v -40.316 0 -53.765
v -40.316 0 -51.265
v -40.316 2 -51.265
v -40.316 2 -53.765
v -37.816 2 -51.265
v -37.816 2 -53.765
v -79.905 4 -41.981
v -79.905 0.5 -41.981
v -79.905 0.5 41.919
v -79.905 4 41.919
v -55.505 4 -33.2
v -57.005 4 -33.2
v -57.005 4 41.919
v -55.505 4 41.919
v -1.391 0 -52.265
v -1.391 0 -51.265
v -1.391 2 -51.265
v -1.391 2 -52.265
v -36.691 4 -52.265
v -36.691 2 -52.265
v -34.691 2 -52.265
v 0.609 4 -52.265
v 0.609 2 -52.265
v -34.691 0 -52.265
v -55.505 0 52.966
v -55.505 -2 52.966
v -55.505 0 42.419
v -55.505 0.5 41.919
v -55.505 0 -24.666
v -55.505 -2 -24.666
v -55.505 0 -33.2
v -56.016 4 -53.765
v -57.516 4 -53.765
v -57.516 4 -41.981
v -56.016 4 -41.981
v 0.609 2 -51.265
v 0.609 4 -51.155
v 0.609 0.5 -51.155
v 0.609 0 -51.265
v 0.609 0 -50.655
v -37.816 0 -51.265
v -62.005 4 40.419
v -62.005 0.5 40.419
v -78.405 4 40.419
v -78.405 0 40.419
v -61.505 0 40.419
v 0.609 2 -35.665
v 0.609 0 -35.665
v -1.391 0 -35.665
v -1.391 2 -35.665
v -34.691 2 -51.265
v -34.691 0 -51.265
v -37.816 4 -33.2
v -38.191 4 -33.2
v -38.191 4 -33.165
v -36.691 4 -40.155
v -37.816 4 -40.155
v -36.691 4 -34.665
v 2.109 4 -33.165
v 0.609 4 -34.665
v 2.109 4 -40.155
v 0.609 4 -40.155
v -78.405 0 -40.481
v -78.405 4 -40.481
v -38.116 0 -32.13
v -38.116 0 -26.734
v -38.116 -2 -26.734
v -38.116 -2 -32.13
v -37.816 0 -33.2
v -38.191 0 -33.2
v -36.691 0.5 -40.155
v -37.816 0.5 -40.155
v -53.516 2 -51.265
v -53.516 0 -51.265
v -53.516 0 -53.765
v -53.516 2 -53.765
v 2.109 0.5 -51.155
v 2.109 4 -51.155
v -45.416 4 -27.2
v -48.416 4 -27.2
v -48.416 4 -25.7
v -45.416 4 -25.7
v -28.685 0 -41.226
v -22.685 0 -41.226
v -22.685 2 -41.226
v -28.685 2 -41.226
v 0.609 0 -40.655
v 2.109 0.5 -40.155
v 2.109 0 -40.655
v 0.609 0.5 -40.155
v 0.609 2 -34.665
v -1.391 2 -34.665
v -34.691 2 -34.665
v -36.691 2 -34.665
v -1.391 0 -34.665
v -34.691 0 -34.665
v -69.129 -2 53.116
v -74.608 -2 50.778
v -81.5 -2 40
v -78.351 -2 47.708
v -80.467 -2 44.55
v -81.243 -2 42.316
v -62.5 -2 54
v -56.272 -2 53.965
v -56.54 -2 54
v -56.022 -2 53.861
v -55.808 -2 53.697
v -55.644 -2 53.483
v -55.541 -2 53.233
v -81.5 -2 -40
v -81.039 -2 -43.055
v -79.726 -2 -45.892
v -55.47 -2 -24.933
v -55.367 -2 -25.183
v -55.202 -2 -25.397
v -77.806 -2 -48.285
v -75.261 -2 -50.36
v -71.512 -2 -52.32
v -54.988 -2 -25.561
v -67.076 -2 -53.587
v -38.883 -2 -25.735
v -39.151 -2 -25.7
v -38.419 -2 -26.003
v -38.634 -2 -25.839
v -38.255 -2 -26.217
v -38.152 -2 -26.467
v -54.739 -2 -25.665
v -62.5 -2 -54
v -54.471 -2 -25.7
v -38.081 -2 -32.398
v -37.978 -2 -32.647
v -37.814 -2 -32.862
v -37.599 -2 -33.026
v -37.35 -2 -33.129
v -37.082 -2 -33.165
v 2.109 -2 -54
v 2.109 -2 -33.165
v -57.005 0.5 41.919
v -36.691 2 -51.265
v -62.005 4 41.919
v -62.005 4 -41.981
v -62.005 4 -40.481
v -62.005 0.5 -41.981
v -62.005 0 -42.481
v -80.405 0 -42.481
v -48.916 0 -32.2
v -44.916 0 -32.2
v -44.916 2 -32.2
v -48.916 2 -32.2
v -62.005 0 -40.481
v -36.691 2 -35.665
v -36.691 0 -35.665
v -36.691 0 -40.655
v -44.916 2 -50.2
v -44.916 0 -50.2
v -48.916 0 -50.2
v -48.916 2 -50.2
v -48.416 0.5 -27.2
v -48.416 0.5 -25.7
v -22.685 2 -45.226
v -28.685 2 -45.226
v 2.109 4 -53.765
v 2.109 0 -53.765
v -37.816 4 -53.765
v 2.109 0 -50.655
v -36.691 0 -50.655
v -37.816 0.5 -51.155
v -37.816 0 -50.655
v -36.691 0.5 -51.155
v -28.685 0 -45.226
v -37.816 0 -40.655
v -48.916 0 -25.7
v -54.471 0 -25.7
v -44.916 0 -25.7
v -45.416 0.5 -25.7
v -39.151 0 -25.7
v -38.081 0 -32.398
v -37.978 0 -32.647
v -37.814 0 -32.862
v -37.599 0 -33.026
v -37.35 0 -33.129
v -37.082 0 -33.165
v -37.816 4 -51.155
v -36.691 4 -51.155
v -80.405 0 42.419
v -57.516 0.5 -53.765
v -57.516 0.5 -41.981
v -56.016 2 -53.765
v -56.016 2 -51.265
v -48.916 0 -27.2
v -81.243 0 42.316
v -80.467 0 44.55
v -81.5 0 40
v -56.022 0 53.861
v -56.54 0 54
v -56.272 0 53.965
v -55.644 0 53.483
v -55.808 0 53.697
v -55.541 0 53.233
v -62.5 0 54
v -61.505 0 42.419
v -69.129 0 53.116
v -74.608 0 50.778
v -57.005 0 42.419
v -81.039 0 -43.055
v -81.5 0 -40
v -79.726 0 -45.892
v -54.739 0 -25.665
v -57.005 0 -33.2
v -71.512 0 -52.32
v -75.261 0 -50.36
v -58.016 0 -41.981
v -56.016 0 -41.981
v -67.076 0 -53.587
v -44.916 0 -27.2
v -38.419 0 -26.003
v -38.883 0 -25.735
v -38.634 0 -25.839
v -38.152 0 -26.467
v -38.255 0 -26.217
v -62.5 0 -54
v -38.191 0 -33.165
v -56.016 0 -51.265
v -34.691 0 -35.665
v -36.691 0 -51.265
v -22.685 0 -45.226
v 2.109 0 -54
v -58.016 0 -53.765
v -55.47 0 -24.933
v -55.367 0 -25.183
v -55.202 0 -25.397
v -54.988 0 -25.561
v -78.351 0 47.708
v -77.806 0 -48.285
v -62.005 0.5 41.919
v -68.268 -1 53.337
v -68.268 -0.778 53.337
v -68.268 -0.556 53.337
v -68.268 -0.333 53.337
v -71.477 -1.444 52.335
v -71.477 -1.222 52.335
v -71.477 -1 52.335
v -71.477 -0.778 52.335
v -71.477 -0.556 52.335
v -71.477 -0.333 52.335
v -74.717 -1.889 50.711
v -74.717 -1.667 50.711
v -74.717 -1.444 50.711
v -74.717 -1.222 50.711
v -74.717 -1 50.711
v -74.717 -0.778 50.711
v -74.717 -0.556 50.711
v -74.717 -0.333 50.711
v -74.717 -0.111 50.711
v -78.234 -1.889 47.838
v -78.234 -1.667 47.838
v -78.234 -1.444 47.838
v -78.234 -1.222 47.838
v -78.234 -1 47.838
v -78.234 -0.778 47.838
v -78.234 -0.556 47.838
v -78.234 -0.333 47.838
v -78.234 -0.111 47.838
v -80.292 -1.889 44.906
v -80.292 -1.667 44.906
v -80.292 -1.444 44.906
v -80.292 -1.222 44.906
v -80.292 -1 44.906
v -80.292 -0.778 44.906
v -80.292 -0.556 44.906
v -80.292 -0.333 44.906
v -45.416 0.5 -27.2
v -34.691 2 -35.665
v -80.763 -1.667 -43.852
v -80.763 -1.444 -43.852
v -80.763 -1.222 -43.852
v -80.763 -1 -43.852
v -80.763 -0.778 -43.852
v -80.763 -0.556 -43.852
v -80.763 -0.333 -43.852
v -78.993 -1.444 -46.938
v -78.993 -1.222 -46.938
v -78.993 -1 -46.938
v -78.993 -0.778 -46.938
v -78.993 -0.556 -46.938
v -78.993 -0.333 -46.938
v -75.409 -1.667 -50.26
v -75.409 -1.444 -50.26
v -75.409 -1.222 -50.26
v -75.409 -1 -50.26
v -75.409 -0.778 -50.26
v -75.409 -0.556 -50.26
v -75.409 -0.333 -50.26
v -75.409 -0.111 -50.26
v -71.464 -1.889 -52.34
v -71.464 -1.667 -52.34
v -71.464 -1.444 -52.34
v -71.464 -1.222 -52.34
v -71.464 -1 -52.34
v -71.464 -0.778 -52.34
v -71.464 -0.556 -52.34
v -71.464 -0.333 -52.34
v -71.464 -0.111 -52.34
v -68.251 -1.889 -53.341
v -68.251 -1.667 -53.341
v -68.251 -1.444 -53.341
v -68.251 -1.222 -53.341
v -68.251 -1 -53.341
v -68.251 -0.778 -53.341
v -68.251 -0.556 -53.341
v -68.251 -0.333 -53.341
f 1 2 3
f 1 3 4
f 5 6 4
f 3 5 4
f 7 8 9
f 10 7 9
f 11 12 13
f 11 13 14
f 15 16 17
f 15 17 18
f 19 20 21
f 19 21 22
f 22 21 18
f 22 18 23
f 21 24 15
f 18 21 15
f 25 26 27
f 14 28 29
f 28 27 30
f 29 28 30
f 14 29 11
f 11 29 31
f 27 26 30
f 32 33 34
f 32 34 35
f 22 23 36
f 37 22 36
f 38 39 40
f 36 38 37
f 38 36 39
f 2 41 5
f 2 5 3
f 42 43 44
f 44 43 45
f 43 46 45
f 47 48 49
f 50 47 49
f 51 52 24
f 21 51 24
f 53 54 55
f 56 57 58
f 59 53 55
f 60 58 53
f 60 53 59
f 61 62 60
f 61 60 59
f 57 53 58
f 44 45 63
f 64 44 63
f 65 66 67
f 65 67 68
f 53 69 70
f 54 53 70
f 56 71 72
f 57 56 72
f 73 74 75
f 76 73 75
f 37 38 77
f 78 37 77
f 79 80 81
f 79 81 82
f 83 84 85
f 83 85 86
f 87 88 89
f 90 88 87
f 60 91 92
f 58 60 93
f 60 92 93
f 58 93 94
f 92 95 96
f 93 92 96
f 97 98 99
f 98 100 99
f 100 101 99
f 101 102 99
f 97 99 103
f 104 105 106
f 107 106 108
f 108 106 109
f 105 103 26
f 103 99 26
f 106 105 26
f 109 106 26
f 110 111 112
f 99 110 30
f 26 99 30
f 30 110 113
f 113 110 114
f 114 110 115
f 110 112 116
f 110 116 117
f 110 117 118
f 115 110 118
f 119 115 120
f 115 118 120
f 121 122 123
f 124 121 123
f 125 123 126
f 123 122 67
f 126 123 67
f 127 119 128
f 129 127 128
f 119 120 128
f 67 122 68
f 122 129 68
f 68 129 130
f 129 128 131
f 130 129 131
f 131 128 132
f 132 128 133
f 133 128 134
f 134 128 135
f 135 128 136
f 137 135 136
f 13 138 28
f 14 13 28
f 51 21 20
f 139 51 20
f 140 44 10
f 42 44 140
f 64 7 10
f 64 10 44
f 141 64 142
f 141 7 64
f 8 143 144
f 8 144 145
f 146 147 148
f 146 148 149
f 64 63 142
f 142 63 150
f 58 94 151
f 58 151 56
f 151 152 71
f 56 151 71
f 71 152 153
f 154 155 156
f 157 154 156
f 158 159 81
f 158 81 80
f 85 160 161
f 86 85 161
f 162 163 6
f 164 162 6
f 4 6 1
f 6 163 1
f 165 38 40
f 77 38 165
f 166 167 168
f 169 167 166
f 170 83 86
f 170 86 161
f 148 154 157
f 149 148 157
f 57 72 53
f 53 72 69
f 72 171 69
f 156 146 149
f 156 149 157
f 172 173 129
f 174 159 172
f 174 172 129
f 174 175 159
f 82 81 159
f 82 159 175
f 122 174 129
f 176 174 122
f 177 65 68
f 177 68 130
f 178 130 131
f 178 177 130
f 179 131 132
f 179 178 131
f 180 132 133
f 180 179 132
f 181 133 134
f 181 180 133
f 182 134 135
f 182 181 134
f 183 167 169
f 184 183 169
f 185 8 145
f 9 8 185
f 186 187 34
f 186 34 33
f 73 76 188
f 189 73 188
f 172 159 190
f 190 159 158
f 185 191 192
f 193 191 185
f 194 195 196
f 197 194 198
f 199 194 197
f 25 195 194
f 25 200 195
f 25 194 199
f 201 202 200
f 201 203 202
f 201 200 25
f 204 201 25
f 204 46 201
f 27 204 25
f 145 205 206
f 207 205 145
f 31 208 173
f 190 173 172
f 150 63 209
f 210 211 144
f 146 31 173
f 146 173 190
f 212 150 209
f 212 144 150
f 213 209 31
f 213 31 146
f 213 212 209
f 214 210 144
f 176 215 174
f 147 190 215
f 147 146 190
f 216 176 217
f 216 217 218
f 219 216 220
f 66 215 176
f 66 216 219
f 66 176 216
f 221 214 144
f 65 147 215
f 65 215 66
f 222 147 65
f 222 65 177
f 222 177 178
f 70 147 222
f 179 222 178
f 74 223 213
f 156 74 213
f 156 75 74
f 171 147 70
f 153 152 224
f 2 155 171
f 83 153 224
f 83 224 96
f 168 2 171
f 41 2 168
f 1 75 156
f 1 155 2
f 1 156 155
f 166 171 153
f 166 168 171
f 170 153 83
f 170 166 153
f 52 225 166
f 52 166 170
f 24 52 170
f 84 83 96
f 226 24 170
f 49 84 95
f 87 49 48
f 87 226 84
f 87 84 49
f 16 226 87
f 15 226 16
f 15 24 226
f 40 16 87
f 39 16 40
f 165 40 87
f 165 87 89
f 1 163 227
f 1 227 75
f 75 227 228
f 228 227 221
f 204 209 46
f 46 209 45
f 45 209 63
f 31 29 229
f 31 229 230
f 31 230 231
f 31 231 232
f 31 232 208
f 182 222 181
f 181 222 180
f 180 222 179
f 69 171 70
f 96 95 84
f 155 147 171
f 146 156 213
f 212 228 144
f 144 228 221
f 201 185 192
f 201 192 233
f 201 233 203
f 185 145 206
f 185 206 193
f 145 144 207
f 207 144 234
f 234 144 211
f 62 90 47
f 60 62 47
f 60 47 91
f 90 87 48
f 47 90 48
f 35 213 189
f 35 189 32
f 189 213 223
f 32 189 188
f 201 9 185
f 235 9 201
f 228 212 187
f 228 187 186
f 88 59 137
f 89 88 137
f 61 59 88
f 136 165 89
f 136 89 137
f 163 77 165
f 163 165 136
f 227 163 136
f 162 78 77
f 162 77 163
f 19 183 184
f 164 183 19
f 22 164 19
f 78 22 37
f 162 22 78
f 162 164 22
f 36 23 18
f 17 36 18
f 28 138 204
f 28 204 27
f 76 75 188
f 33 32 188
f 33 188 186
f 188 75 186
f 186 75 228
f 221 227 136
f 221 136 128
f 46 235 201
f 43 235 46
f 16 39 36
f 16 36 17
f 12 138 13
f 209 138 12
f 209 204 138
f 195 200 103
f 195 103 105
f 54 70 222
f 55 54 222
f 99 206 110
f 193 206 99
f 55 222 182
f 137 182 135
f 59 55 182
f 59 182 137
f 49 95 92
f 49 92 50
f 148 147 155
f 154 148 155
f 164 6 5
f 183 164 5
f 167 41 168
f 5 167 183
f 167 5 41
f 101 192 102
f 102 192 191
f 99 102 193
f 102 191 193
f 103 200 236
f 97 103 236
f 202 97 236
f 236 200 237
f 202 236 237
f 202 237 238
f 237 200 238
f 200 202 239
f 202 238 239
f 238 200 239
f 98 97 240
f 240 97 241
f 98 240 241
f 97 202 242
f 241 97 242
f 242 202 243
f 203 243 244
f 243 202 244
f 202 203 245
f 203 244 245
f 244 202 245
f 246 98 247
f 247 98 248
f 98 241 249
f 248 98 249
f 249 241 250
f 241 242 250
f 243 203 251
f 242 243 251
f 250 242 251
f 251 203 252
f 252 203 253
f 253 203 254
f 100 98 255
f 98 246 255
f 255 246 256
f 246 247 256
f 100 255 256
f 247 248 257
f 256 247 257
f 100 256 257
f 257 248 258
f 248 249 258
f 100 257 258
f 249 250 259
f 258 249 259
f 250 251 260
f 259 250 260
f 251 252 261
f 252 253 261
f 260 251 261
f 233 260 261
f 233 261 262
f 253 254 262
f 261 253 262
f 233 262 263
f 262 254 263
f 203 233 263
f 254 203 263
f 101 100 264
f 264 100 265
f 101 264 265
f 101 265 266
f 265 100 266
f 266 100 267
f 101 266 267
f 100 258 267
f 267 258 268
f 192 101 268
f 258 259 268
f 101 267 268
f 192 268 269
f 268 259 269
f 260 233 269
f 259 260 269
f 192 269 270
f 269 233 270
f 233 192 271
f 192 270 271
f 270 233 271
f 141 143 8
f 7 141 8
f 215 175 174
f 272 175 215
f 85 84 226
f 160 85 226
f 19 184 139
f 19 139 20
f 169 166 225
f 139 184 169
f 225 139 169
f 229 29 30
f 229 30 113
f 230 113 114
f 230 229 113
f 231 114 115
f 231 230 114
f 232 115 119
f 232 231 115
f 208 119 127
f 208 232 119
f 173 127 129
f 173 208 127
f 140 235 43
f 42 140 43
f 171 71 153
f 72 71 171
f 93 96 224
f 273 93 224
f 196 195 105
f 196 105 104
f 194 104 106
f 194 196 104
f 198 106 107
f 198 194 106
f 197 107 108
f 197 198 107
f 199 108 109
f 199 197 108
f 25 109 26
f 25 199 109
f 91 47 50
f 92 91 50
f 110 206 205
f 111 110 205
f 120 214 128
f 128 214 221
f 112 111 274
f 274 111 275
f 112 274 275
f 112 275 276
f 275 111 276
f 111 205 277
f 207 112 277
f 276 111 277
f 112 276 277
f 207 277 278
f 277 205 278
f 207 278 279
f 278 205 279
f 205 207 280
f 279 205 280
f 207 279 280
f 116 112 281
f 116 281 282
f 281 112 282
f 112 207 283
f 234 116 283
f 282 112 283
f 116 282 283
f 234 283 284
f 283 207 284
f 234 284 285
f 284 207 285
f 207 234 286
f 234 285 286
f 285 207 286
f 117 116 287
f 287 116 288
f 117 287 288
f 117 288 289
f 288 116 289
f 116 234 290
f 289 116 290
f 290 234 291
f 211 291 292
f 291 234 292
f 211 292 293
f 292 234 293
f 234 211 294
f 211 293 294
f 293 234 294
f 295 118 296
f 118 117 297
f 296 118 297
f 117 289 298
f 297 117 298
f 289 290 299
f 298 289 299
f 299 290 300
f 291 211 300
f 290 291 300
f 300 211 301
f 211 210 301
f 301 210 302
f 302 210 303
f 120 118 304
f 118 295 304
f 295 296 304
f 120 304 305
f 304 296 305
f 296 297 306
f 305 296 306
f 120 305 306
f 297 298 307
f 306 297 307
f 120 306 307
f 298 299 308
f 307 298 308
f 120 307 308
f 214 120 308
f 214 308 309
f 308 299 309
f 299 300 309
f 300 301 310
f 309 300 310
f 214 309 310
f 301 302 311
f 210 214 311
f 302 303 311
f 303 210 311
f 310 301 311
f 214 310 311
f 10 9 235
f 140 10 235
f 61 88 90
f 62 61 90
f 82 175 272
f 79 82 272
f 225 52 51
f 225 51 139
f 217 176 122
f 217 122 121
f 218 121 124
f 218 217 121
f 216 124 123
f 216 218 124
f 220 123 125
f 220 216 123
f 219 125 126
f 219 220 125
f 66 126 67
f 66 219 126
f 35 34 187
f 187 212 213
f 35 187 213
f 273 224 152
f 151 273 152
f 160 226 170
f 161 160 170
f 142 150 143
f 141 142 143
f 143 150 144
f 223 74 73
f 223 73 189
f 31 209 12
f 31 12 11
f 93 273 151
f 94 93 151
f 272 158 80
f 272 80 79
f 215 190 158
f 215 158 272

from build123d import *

# Parameters (mm, degrees)
BOSS_EXTRUDE1_DEPTH   = 4
SKETCH1_W             = 1.5
SKETCH1_H             = 11.783355086
BOSS_EXTRUDE1_2_DEPTH = 4
SKETCH1_H_2           = 75.118771789
BOSS_EXTRUDE1_3_DEPTH = 4
BOSS_EXTRUDE1_4_DEPTH = 4
BOSS_EXTRUDE1_5_DEPTH = 4
SKETCH1_W_2           = 3
SKETCH1_H_3           = 1.5
BOSS_EXTRUDE1_6_DEPTH = 4
BOSS_EXTRUDE2_DEPTH   = 2
SKETCH5_W             = 2.5
SKETCH5_H             = 2.5
SKETCH5_W_2           = 2
SKETCH5_H_2           = 1
SKETCH5_W_3           = 4
SKETCH5_H_3           = 18
SKETCH5_W_4           = 6
SKETCH5_H_4           = 4
BOSS_EXTRUDE3_DEPTH   = 2
CHAMFER1_SIZE         = 0.5


with BuildPart() as part:
    # Sketch1 → Boss-Extrude1 (new body)
    with BuildSketch(Plane(origin=(0, 0, 0), x_dir=(1, 0, 0), z_dir=(0, 1, 0))):
        Polygon((-78.405339878, 40.481228211), (-62.005339878, 40.481228211), (-62.005339878, 41.981228211), (-79.905339878, 41.981228211), (-79.905339878, -41.918771789), (-62.005339878, -41.918771789), (-62.005339878, -40.418771789), (-78.405339878, -40.418771789), align=None)
    extrude(amount=BOSS_EXTRUDE1_DEPTH)



with BuildPart() as body_2:
    # Sketch1 → Boss-Extrude1 2 (new body)
    with BuildSketch(Plane(origin=(0, 0, 0), x_dir=(1, 0, 0), z_dir=(0, 1, 0))):
        with Locations((-56.76645947, 47.872905754)):
            Rectangle(SKETCH1_W, SKETCH1_H)
    extrude(amount=BOSS_EXTRUDE1_2_DEPTH)


with BuildPart() as body_3:
    # Sketch1 → Boss-Extrude1 3 (new body)
    with BuildSketch(Plane(origin=(0, 0, 0), x_dir=(1, 0, 0), z_dir=(0, 1, 0))):
        with Locations((-56.255339878, -4.359385895)):
            Rectangle(SKETCH1_W, SKETCH1_H_2)
    extrude(amount=BOSS_EXTRUDE1_3_DEPTH)


with BuildPart() as body_4:
    # Sketch1 → Boss-Extrude1 4 (new body)
    with BuildSketch(Plane(origin=(0, 0, 0), x_dir=(1, 0, 0), z_dir=(0, 1, 0))):
        Polygon((-38.191144671, 33.2), (-38.191144671, 33.164583297), (2.108855329, 33.164583297), (2.108855329, 40.155086191), (0.608855329, 40.155086191), (0.608855329, 34.664583297), (-36.691144671, 34.664583297), (-36.691144671, 40.155086191), (-37.81645947, 40.155086191), (-37.81645947, 33.2), align=None)
    extrude(amount=BOSS_EXTRUDE1_4_DEPTH)


with BuildPart() as body_5:
    # Sketch1 → Boss-Extrude1 5 (new body)
    with BuildSketch(Plane(origin=(0, 0, 0), x_dir=(1, 0, 0), z_dir=(0, 1, 0))):
        Polygon((-36.691144671, 52.264583297), (0.608855329, 52.264583297), (0.608855329, 51.155086191), (2.108855329, 51.155086191), (2.108855329, 53.764583297), (-37.81645947, 53.764583297), (-37.81645947, 51.155086191), (-36.691144671, 51.155086191), align=None)
    extrude(amount=BOSS_EXTRUDE1_5_DEPTH)


with BuildPart() as body_6:
    # Sketch1 → Boss-Extrude1 6 (new body)
    with BuildSketch(Plane(origin=(0, 0, 0), x_dir=(1, 0, 0), z_dir=(0, 1, 0))):
        with Locations((-46.91645947, 26.45)):
            Rectangle(SKETCH1_W_2, SKETCH1_H_3)
    extrude(amount=BOSS_EXTRUDE1_6_DEPTH)


with BuildPart() as part_1:
    add(part.part)

    add(body_2.part)  # Boss-Extrude2 merges body 2

    add(body_3.part)  # Boss-Extrude2 merges body 3

    add(body_4.part)  # Boss-Extrude2 merges body 4

    add(body_5.part)  # Boss-Extrude2 merges body 5

    add(body_6.part)  # Boss-Extrude2 merges body 6
    # Sketch2 → Boss-Extrude2 (add)
    with BuildSketch(Plane(origin=(0, 0, 0), x_dir=(1, 0, 0), z_dir=(0, 1, 0))):
        with BuildLine():
            Line((2.108855329, 33.164583297), (2.108855329, 54))
            Line((2.108855329, 54), (-62.5, 54))
            add(Edge.make_bspline(
                [(-81.5, 40), (-81.502243344, 41.173845434), (-81.047727895, 43.124370376), (-80.54933313, 44.398501715), (-80.092349724, 45.289360005), (-79.662158352, 46.003599412), (-79.23101892, 46.6298604), (-78.635262131, 47.400336774), (-77.699592936, 48.420815991), (-76.62065129, 49.371224085), (-75.777066539, 50.008965255), (-75.040717172, 50.51071787), (-74.379360639, 50.920225906), (-73.506270835, 51.414278971), (-72.232742284, 52.035673953), (-70.694700828, 52.643574158), (-69.042987408, 53.155056852), (-67.458196566, 53.527596425), (-64.612663916, 54.000370418), (-62.5, 54)],
                knots=[0, 0, 0, 0.09375, 0.15625, 0.203125, 0.234375, 0.265625, 0.296875, 0.34375, 0.40625, 0.453125, 0.484375, 0.515625, 0.546875, 0.59375, 0.65625, 0.71875, 0.78125, 0.84375, 1, 1, 1], degree=2))
            Line((-81.5, 40), (-81.5, -40))
            add(Edge.make_bspline(
                [(-62.5, -54), (-64.618902003, -54.0002947), (-67.472295819, -53.524829059), (-69.063795556, -53.149419159), (-70.709213964, -52.638392619), (-72.243956614, -52.030656852), (-73.514824803, -51.409674441), (-74.386323364, -50.916027289), (-75.046726548, -50.506800365), (-75.781311966, -50.005949538), (-76.623163869, -49.369184511), (-77.700208559, -48.420059301), (-78.634474848, -47.401139234), (-79.230307159, -46.630574159), (-79.658424233, -46.009526136), (-80.105053847, -45.269217428), (-80.571288214, -44.360595976), (-81.072895683, -43.06600328), (-81.499778686, -41.179608093), (-81.5, -40)],
                knots=[0, 0, 0, 0.15625, 0.21875, 0.28125, 0.34375, 0.40625, 0.453125, 0.484375, 0.515625, 0.546875, 0.59375, 0.65625, 0.703125, 0.734375, 0.765625, 0.796875, 0.84375, 0.90625, 1, 1, 1], degree=2))
            Line((-62.5, -54), (-56.539545182, -54))
            ThreePointArc((-56.539545182, -54), (-55.808251599, -53.69708828), (-55.505339878, -52.965794696))
            Line((-55.505339878, -52.965794696), (-55.505339878, 24.665794696))
            ThreePointArc((-55.505339878, 24.665794696), (-55.202428158, 25.39708828), (-54.471134574, 25.7))
            Line((-54.471134574, 25.7), (-39.150664774, 25.7))
            ThreePointArc((-39.150664774, 25.7), (-38.41937119, 26.00291172), (-38.11645947, 26.734205304))
            Line((-38.11645947, 26.734205304), (-38.11645947, 32.130377993))
            ThreePointArc((-38.11645947, 32.130377993), (-37.813547749, 32.861671577), (-37.082254166, 33.164583297))
            Line((-37.082254166, 33.164583297), (2.108855329, 33.164583297))
        make_face()
    extrude(amount=-BOSS_EXTRUDE2_DEPTH)

    # Sketch5 → Boss-Extrude3 (add)
    with BuildSketch(Plane(origin=(0, 0, 0), x_dir=(-1, 0, 0), z_dir=(0, -1, 0))):
        with Locations((54.76645947, 52.514583297)):
            Rectangle(SKETCH5_W, SKETCH5_H)
        with Locations((35.691144671, 51.764583297)):
            Rectangle(SKETCH5_W_2, SKETCH5_H_2)
        with Locations((46.91645947, 41.2)):
            Rectangle(SKETCH5_W_3, SKETCH5_H_3)
        with Locations((39.06645947, 52.514583297)):
            Rectangle(SKETCH5_W, SKETCH5_H)
        with Locations((35.691144671, 35.164583297)):
            Rectangle(SKETCH5_W_2, SKETCH5_H_2)
        with Locations((0.391144671, 51.764583297)):
            Rectangle(SKETCH5_W_2, SKETCH5_H_2)
        with Locations((0.391144671, 35.164583297)):
            Rectangle(SKETCH5_W_2, SKETCH5_H_2)
        with Locations((25.685282836, 43.226347046)):
            Rectangle(SKETCH5_W_4, SKETCH5_H_4)
    extrude(amount=-BOSS_EXTRUDE3_DEPTH)

    # Chamfer1
    chamfer1_edges = [part_1.edges().sort_by_distance(p)[0] for p in [
        (-37.25380207, 0, -40.155086191),
        (-37.25380207, 0, -51.155086191),
        (1.358855329, 0, -40.155086191),
        (1.358855329, 0, -51.155086191),
        (-45.41645947, 0, -26.45),
        (-48.41645947, 0, -26.45),
        (-56.255339878, 0, 41.918771789),
        (-57.51645947, 0, -47.872905754),
        (-62.005339878, 0, 41.168771789),
        (-70.955339878, 0, 41.918771789),
        (-79.905339878, 0, -0.031228211),
        (-70.955339878, 0, -41.981228211),
    ]]
    chamfer(chamfer1_edges, length=CHAMFER1_SIZE)


solid = part_1.part
